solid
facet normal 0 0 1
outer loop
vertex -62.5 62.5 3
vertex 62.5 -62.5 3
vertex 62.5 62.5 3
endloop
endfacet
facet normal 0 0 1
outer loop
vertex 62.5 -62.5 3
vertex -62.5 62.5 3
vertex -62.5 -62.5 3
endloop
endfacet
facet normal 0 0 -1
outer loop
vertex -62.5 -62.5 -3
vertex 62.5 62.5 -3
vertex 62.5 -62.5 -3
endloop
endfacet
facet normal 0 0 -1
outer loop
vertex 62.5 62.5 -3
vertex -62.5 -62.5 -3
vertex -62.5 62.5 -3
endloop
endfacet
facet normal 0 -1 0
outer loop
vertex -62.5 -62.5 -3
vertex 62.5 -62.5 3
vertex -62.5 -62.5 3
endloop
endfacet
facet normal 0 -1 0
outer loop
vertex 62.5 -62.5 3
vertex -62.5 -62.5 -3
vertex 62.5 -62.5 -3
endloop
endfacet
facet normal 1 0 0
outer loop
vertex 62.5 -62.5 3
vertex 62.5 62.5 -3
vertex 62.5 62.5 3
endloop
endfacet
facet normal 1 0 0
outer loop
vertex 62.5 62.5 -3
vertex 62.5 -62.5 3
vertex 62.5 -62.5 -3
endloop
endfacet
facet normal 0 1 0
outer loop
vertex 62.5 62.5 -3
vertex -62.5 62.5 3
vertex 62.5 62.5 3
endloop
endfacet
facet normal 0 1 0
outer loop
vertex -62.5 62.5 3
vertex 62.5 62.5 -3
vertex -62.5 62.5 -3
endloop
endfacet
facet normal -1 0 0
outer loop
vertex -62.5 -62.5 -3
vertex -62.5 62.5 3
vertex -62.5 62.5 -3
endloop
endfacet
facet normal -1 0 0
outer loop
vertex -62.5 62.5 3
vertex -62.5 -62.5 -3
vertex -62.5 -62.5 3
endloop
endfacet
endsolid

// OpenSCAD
// ========================================
// a 125 x 125 x 6 mm plate
// NeuroCAD canonical IR; dimensions are millimetres
// ========================================
$fn = 48;

cube(size=[125, 125, 6], center=true);
